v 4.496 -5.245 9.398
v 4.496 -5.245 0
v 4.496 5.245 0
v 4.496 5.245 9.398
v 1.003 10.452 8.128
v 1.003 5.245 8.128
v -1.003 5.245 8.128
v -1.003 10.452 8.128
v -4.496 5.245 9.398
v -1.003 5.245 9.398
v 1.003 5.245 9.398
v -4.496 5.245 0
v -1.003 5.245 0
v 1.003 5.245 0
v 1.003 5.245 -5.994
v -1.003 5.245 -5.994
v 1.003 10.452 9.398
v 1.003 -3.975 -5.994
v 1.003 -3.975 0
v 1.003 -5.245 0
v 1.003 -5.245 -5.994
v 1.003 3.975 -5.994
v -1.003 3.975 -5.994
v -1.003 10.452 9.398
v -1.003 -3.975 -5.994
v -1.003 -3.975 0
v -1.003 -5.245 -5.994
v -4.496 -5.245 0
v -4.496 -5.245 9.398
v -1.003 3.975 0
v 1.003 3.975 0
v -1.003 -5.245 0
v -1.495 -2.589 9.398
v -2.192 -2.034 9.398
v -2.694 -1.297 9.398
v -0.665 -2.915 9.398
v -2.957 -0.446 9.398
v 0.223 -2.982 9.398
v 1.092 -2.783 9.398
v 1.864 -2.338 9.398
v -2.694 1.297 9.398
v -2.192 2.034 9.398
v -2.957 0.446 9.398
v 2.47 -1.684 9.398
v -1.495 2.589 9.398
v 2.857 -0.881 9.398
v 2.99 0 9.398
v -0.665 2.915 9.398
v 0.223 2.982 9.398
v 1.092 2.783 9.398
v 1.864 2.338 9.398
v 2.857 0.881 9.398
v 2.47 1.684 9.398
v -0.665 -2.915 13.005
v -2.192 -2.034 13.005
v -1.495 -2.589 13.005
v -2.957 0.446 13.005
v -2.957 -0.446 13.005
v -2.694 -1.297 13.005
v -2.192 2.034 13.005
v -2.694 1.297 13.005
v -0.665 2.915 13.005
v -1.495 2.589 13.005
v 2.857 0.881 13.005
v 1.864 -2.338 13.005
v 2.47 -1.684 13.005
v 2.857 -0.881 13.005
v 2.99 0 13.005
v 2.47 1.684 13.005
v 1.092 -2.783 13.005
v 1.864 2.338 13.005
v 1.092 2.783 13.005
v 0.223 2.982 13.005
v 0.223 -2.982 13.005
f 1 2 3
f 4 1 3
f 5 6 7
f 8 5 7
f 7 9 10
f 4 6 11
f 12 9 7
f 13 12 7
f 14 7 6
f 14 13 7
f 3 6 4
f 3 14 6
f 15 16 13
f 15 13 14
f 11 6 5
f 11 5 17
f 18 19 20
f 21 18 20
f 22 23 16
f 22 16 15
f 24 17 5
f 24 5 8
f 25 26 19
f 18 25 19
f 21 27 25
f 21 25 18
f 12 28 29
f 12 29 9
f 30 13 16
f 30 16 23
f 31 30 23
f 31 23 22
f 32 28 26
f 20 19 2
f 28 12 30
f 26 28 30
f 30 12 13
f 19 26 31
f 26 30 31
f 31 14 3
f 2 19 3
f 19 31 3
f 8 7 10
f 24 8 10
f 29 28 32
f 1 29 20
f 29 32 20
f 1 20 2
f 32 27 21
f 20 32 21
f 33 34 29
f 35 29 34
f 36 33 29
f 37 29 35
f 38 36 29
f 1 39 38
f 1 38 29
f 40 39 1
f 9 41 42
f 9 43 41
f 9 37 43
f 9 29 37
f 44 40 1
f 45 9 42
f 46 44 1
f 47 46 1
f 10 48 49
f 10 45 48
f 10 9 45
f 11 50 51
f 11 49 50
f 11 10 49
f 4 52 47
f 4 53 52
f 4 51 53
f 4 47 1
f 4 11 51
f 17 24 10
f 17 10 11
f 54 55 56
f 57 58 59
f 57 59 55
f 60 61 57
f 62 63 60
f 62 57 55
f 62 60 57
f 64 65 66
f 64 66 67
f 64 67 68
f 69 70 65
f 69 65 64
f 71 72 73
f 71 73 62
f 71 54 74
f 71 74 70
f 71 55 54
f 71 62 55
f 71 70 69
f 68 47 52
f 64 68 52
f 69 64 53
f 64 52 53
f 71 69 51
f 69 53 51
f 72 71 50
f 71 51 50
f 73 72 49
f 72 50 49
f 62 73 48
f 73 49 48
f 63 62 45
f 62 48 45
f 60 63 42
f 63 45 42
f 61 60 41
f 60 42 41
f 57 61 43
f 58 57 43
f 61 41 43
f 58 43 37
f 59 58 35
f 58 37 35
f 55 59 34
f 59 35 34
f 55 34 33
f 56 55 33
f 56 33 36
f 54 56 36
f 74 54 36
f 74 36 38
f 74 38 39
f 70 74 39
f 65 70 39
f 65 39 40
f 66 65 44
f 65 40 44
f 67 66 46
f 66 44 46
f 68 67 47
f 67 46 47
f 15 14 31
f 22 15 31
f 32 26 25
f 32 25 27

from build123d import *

# Parameters (mm, degrees)
F0_W     = 8.9916
F0_H     = 10.4902
F1_DEPTH = 9.398
F2_R     = 2.99
F3_DEPTH = 3.6068
F4_W     = 2.0066
F4_H     = 1.27
F5_DEPTH = 5.207
F6_W     = 2.0066
F6_H     = 1.27
F7_DEPTH = 5.9944


with BuildPart() as f1:
    # F0 (on Top) → F1 (new body)
    with BuildSketch(Plane.XY):
        Rectangle(F0_W, F0_H)
    extrude(amount=F1_DEPTH)

    # F2 (on face) → F3 (join)
    with BuildSketch(Plane.XY.offset(9.398)):
        Circle(F2_R)
    extrude(amount=F3_DEPTH)

    # F4 (on face) → F5 (join)
    with BuildSketch(Plane(origin=(0, 5.2451, 0), x_dir=(-1, 0, 0), z_dir=(0, 1, 0))):
        with Locations((0, 8.763)):
            Rectangle(F4_W, F4_H)
    extrude(amount=F5_DEPTH)

    # F6 (on face) → F7 (join)
    with BuildSketch(Plane(origin=(0, 0, 0), x_dir=(1, 0, 0), z_dir=(0, 0, -1))):
        with Locations((0, 4.6101)):
            Rectangle(F6_W, F6_H)
        with Locations((0, -4.6101)):
            Rectangle(F6_W, F6_H)
    extrude(amount=F7_DEPTH)


solid = f1.part
